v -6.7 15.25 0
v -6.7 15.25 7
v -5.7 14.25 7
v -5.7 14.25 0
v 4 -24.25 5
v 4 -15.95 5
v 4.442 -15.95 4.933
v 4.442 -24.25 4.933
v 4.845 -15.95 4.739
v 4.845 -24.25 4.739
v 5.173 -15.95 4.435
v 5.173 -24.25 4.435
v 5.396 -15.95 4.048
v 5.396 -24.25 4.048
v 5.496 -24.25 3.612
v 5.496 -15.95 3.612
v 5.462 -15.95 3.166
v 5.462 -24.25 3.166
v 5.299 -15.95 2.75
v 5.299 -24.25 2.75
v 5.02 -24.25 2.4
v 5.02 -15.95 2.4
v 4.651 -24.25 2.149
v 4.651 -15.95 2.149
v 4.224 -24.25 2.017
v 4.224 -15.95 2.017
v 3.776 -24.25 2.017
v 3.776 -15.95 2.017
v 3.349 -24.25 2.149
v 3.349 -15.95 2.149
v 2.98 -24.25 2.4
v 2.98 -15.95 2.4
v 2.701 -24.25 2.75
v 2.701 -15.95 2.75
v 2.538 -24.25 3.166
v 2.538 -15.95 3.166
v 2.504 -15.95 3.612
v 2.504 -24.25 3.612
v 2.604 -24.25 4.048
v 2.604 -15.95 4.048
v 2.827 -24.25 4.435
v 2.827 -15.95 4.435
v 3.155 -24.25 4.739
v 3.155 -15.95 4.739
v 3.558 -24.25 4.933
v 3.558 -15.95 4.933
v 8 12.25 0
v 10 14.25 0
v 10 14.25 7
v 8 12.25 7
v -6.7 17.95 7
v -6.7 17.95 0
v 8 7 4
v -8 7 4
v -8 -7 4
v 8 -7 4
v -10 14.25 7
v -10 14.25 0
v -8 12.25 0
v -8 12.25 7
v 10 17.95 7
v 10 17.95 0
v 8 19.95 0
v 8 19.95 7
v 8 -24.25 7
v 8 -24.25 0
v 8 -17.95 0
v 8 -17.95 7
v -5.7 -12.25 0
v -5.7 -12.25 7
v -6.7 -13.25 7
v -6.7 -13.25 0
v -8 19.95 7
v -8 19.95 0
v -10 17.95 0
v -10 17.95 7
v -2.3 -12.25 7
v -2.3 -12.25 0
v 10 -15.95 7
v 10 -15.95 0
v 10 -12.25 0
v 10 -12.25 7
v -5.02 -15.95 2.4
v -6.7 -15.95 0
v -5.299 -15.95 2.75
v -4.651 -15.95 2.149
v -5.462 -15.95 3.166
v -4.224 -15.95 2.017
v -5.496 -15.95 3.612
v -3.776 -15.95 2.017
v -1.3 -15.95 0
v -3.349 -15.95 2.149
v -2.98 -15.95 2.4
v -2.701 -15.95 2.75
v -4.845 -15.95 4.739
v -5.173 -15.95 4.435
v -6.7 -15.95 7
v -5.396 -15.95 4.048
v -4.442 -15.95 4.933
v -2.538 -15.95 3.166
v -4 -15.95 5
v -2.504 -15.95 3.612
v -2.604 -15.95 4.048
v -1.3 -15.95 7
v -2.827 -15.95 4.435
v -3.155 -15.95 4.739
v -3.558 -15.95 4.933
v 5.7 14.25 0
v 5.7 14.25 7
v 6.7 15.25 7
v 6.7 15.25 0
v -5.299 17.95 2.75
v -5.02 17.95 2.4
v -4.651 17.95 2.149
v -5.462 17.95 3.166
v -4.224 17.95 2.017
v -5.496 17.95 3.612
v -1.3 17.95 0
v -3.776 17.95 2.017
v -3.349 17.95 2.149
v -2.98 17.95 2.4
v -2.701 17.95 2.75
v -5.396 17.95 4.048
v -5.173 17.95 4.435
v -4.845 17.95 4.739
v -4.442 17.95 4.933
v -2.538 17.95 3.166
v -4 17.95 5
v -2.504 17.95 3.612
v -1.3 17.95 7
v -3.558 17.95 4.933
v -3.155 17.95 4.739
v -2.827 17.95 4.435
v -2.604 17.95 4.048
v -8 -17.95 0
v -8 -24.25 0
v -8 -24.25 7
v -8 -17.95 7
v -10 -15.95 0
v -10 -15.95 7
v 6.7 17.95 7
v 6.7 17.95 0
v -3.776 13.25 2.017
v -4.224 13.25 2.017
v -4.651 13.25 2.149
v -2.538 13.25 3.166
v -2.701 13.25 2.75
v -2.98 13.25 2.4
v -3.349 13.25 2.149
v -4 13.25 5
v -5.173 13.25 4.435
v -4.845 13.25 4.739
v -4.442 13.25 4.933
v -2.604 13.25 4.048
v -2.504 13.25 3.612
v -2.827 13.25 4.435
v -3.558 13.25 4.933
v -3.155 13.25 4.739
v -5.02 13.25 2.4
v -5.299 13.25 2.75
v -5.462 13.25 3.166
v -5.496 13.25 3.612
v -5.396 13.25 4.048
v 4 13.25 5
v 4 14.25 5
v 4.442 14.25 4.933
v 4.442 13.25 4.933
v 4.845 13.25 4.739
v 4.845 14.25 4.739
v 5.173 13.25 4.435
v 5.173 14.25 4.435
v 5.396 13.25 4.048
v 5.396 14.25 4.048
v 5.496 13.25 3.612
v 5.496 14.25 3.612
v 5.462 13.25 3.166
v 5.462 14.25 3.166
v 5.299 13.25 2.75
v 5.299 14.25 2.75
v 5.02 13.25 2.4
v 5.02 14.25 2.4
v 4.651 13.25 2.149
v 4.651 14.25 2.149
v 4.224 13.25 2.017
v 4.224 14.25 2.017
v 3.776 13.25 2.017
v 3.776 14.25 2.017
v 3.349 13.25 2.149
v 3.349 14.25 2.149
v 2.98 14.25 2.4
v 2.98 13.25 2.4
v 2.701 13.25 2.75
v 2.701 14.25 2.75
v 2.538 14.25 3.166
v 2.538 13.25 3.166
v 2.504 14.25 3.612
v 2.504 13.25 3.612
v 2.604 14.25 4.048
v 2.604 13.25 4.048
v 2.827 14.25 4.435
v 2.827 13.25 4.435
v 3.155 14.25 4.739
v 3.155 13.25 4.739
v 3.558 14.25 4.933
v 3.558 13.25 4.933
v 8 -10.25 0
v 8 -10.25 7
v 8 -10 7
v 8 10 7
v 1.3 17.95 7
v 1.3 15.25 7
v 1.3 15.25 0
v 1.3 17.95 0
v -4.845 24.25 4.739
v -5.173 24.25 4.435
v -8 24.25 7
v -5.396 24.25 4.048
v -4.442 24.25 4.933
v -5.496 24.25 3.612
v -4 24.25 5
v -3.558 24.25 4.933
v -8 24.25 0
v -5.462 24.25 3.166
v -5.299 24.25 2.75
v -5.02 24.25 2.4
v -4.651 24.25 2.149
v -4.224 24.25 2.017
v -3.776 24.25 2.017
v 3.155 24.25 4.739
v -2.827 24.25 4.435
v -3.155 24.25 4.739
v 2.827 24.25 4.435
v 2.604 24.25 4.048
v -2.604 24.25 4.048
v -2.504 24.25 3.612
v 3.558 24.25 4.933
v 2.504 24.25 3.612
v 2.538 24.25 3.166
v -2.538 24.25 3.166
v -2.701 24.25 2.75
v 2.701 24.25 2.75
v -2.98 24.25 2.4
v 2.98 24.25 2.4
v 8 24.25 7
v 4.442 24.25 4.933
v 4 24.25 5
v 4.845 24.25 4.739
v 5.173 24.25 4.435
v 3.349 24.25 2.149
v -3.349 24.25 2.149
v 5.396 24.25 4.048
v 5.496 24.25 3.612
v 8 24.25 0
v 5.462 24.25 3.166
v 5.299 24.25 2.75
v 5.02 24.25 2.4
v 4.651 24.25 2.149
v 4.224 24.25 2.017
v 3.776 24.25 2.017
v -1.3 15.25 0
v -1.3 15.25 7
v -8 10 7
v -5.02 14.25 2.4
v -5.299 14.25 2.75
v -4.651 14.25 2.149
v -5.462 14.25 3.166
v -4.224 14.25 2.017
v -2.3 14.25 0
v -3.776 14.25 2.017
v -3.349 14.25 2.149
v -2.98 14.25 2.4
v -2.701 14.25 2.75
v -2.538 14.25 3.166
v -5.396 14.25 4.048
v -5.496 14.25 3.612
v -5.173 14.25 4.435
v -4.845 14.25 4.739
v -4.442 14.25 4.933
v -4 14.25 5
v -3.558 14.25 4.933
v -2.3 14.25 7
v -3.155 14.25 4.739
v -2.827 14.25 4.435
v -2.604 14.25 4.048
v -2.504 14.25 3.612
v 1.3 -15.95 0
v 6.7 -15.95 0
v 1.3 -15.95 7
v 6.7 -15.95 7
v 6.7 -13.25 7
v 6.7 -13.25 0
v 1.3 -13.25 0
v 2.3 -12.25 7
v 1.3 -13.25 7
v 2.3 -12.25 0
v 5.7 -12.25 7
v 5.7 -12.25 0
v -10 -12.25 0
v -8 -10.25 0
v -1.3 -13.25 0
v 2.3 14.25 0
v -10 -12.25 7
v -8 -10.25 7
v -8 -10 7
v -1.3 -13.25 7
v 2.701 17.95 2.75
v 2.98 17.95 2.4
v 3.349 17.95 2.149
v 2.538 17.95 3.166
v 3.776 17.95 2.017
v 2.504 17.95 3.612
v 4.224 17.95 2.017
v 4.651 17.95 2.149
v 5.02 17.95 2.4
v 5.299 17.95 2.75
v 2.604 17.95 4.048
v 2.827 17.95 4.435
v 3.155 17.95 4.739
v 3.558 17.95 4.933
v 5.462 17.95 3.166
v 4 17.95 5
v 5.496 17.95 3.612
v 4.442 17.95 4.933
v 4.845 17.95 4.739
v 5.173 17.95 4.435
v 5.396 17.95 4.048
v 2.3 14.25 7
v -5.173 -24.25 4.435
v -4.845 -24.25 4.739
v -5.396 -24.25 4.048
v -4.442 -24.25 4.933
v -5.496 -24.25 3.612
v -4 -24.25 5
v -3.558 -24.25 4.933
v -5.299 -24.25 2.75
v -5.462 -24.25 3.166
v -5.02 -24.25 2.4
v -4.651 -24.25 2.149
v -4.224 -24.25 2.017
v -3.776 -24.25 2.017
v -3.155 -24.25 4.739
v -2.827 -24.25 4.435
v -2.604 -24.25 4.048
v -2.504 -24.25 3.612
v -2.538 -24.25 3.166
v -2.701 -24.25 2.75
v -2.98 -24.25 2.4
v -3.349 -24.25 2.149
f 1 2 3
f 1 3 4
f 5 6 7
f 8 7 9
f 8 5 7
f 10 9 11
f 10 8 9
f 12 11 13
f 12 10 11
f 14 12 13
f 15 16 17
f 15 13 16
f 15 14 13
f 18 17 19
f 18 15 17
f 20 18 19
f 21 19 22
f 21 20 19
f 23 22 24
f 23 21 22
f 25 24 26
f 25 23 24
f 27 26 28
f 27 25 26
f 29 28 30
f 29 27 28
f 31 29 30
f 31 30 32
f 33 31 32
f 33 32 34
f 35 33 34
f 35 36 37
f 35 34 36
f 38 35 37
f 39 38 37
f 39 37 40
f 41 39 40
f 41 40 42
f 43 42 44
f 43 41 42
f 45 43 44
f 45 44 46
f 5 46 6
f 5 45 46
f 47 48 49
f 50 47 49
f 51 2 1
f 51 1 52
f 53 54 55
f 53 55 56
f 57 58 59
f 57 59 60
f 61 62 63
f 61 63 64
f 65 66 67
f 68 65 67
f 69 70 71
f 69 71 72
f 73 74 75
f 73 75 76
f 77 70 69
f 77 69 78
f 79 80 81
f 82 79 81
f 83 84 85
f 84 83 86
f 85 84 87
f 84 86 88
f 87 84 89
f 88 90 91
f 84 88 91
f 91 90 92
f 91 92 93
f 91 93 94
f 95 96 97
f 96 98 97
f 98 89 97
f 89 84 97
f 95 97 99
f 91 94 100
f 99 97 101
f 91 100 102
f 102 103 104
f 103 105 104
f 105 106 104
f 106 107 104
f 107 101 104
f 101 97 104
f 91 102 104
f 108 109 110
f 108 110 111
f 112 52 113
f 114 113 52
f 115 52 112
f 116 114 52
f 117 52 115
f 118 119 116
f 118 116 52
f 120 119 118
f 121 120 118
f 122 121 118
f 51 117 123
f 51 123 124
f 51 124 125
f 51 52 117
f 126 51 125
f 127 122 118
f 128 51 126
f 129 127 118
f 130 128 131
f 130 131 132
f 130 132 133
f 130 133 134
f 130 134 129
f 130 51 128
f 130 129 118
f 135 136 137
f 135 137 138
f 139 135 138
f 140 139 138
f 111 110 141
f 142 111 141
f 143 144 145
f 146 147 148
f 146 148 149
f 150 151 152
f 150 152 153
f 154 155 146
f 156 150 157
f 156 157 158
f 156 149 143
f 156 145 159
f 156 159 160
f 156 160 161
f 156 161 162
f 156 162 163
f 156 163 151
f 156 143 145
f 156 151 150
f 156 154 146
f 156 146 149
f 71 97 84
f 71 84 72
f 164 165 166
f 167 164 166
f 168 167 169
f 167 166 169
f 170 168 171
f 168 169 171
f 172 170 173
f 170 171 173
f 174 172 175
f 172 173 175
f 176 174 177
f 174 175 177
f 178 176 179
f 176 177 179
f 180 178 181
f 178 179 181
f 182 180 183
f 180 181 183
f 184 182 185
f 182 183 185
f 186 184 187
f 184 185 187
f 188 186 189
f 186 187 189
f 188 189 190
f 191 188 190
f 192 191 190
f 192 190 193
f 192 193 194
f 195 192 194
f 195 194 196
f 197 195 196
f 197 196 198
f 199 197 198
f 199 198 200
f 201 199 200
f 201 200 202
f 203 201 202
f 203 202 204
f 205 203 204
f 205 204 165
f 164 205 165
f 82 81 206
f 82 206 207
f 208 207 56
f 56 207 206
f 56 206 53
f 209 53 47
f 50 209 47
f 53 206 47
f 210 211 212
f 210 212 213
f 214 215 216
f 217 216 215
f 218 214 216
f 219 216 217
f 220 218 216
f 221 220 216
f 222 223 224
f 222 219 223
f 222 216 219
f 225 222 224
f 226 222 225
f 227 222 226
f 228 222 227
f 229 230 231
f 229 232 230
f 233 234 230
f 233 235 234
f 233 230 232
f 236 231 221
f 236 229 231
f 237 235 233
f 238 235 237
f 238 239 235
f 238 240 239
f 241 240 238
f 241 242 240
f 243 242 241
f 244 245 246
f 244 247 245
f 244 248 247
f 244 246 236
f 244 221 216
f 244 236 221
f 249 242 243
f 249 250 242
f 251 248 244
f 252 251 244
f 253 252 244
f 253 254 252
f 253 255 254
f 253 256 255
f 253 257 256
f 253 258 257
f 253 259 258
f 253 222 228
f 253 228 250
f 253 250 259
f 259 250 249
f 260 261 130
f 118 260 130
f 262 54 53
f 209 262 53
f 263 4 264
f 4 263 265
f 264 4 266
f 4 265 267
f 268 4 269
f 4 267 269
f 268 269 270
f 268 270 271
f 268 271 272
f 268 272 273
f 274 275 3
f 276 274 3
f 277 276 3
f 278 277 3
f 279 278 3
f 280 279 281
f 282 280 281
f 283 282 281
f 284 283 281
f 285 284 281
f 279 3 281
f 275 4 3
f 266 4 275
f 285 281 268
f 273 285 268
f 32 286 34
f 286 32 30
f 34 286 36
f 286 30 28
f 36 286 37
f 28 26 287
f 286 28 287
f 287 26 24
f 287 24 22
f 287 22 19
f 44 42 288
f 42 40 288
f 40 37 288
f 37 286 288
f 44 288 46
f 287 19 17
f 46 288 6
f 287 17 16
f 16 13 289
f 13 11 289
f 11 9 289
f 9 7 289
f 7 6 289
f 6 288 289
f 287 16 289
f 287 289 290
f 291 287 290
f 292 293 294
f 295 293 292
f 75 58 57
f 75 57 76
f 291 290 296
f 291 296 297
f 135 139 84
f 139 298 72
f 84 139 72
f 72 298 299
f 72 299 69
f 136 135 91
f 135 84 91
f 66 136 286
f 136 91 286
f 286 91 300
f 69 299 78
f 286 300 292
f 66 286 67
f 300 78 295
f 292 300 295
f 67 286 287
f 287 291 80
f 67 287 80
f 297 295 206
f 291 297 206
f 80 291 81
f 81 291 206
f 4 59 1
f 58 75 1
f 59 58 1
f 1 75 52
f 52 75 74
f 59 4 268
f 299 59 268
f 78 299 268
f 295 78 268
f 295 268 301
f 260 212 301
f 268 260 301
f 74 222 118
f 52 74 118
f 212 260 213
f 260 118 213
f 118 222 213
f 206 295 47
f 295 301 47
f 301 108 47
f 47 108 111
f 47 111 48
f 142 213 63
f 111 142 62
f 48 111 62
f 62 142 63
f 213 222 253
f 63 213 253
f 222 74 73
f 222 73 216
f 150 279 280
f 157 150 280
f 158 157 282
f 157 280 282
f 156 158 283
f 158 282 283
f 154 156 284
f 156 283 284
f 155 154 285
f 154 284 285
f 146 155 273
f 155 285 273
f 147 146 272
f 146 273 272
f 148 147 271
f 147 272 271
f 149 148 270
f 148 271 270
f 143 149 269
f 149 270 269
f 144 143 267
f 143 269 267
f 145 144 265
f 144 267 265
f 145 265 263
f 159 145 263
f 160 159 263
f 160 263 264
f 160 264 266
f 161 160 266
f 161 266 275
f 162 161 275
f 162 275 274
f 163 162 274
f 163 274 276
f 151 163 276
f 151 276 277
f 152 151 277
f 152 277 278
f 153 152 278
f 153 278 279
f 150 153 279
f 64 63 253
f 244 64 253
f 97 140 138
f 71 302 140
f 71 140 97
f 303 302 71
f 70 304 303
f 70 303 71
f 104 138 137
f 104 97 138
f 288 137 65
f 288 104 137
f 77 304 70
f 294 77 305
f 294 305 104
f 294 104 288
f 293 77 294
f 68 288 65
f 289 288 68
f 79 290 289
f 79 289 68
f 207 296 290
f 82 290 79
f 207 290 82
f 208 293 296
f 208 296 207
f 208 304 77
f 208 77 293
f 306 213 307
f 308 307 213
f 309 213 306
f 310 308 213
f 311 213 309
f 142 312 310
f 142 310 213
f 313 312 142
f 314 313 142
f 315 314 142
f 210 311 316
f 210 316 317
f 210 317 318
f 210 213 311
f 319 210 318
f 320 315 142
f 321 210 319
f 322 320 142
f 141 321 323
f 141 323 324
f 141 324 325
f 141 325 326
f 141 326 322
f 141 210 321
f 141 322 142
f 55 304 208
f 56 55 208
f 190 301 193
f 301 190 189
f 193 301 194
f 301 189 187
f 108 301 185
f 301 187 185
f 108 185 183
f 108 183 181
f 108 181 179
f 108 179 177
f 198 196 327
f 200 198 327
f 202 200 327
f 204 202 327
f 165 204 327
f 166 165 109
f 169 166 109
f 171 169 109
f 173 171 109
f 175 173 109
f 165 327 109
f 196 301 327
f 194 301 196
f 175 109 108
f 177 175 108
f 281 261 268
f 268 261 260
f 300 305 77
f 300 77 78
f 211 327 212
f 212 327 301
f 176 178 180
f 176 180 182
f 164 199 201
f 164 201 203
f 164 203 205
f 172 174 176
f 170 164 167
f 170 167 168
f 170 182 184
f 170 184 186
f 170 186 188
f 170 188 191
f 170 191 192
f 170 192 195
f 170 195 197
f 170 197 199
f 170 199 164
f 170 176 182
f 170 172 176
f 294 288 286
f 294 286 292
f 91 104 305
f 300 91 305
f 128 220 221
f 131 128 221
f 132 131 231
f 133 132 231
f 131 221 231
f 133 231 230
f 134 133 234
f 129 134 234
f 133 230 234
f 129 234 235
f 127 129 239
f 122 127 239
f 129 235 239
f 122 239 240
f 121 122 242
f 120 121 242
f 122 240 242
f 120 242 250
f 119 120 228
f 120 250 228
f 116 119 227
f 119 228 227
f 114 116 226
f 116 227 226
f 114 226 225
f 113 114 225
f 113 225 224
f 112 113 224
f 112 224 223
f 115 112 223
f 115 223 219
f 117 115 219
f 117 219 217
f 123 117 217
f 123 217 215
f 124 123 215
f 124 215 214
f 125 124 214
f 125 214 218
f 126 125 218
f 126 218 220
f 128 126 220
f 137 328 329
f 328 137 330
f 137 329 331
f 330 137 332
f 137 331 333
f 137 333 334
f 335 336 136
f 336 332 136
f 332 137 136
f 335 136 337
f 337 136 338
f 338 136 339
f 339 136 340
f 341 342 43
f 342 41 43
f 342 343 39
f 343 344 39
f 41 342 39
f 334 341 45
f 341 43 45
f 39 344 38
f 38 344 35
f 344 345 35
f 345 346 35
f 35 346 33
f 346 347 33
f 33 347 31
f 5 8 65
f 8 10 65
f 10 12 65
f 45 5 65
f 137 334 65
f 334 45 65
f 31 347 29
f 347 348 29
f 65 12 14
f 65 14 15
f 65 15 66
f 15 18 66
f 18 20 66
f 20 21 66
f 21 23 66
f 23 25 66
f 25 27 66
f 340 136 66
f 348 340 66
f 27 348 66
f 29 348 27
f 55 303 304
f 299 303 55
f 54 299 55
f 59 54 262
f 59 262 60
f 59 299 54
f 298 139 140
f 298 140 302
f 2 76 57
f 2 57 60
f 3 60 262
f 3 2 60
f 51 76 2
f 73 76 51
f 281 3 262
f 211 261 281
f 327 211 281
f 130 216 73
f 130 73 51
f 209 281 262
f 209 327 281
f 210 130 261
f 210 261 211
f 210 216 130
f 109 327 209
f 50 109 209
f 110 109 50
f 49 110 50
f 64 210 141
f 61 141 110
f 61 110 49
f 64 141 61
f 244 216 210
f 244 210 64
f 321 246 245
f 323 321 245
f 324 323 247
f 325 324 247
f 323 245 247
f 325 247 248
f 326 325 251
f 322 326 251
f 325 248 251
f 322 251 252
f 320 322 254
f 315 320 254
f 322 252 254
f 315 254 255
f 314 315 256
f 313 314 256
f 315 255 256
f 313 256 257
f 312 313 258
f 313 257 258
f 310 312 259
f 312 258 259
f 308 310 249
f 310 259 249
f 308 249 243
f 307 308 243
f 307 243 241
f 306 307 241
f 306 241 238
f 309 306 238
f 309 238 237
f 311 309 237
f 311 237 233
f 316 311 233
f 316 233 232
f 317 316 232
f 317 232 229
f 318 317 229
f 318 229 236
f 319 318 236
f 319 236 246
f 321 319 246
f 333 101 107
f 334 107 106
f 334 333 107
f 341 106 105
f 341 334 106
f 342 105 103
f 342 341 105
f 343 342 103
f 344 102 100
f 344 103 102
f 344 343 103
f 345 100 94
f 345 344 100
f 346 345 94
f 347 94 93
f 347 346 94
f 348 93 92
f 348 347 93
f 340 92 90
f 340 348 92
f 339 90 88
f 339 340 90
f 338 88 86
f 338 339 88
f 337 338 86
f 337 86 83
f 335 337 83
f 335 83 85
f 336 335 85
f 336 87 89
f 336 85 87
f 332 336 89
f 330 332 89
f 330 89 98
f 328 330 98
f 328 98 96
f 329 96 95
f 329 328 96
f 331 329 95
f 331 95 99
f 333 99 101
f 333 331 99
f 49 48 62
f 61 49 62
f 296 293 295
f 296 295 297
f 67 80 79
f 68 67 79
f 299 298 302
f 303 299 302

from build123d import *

# Parameters (mm, degrees)
SKETCH1_W           = 16
SKETCH1_H           = 48.5
BOSS_EXTRUDE1_DEPTH = 7
SKETCH2_W           = 5.4
SKETCH2_H           = 3.7
CUT_EXTRUDE1_DEPTH  = 27.47758486
SKETCH3_OUTSIDE_W   = 28.31
SKETCH3_OUTSIDE_H   = 19.31
SKETCH3_OUTSIDE_W_2 = 16
SKETCH3_OUTSIDE_H_2 = 7
SKETCH3_OUTSIDE_R   = 1.5
CUT_EXTRUDE2_DEPTH  = 11
SKETCH4_W           = 16
SKETCH4_H           = 20
CUT_EXTRUDE3_DEPTH  = 3
CHAMFER1_SIZE       = 3
SKETCH5_W           = 2
SKETCH5_H           = 7.7
BOSS_EXTRUDE2_DEPTH = 7
CHAMFER2_SIZE       = 2
CHAMFER3_SIZE       = 1


with BuildPart() as part:
    # Sketch1 → Boss-Extrude1 (new body)
    with BuildSketch(Plane.XY):
        Rectangle(SKETCH1_W, SKETCH1_H)
    extrude(amount=BOSS_EXTRUDE1_DEPTH)

    # Sketch2 → Cut-Extrude1 (cut, through all)
    with BuildSketch(Plane.XY.offset(7)):
        with Locations((-4, 16.1)):
            Rectangle(SKETCH2_W, SKETCH2_H)
        with Locations((4, 16.1)):
            Rectangle(SKETCH2_W, SKETCH2_H)
        with Locations((4, -14.1)):
            Rectangle(SKETCH2_W, SKETCH2_H)
        with Locations((-4, -14.1)):
            Rectangle(SKETCH2_W, SKETCH2_H)
    extrude(amount=-CUT_EXTRUDE1_DEPTH, mode=Mode.SUBTRACT)

    # Sketch3 outside → Cut-Extrude2 (cut)
    # profile 1 of 3: a face of its own
    with BuildSketch(Plane(origin=(0, 24.25, 0), x_dir=(1, 0, 0), z_dir=(0, 1, 0))):
        with Locations((0, -3.5)):
            Rectangle(SKETCH3_OUTSIDE_W, SKETCH3_OUTSIDE_H)
        with Locations((0, -3.5)):
            Rectangle(SKETCH3_OUTSIDE_W_2, SKETCH3_OUTSIDE_H_2, mode=Mode.SUBTRACT)
    # profile 2 of 3: a face of its own
    with BuildSketch(Plane(origin=(0, 24.25, 0), x_dir=(1, 0, 0), z_dir=(0, 1, 0))):
        with Locations(Location((4, -3.5, 0), (0, 0, 270))):
            Circle(SKETCH3_OUTSIDE_R)
    # profile 3 of 3: a face of its own
    with BuildSketch(Plane(origin=(0, 24.25, 0), x_dir=(1, 0, 0), z_dir=(0, 1, 0))):
        with Locations(Location((-4, -3.5, 0), (0, 0, 270))):
            Circle(SKETCH3_OUTSIDE_R)
    cut_extrude2 = extrude(amount=-CUT_EXTRUDE2_DEPTH, mode=Mode.SUBTRACT)

    # Mirror1: Cut-Extrude2 across plane
    add(cut_extrude2.mirror(Plane.ZX), mode=Mode.SUBTRACT)

    # Sketch4 → Cut-Extrude3 (cut)
    with BuildSketch(Plane.XY.offset(7)):
        Rectangle(SKETCH4_W, SKETCH4_H)
    extrude(amount=-CUT_EXTRUDE3_DEPTH, mode=Mode.SUBTRACT)

    # Chamfer1
    chamfer1_edges = [part.edges().sort_by_distance(p)[0] for p in [
        (0, -10, 4),
        (0, 10, 4),
    ]]
    chamfer(chamfer1_edges, length=CHAMFER1_SIZE - 0.0001)  # a hair under: the kernel refuses the full size

    # Sketch5 → Boss-Extrude2 (add)
    with BuildSketch(Plane(origin=(0, 0, 0), x_dir=(-1, 0, 0), z_dir=(0, 0, -1))):
        with Locations((9, 16.1)):
            Rectangle(SKETCH5_W, SKETCH5_H)
        with Locations((-9, 16.1)):
            Rectangle(SKETCH5_W, SKETCH5_H)
        with Locations((-9, -14.1)):
            Rectangle(SKETCH5_W, SKETCH5_H)
        with Locations((9, -14.1)):
            Rectangle(SKETCH5_W, SKETCH5_H)
    extrude(amount=-BOSS_EXTRUDE2_DEPTH)

    # Chamfer2
    chamfer2_edges = [part.edges().sort_by_distance(p)[0] for p in [
        (-10, -17.95, 3.5),
        (-10, -10.25, 3.5),
        (10, -17.95, 3.5),
        (10, -10.25, 3.5),
        (10, 12.25, 3.5),
        (10, 19.95, 3.5),
        (-10, 12.25, 3.5),
        (-10, 19.95, 3.5),
    ]]
    chamfer(chamfer2_edges, length=CHAMFER2_SIZE - 0.0001)  # a hair under: the kernel refuses the full size

    # Chamfer3
    chamfer3_edges = [part.edges().sort_by_distance(p)[0] for p in [
        (-6.7, -12.25, 3.5),
        (-1.3, -12.25, 3.5),
        (6.7, -12.25, 3.5),
        (1.3, -12.25, 3.5),
        (6.7, 14.25, 3.5),
        (1.3, 14.25, 3.5),
        (-1.3, 14.25, 3.5),
        (-6.7, 14.25, 3.5),
    ]]
    chamfer(chamfer3_edges, length=CHAMFER3_SIZE)


solid = part.part
